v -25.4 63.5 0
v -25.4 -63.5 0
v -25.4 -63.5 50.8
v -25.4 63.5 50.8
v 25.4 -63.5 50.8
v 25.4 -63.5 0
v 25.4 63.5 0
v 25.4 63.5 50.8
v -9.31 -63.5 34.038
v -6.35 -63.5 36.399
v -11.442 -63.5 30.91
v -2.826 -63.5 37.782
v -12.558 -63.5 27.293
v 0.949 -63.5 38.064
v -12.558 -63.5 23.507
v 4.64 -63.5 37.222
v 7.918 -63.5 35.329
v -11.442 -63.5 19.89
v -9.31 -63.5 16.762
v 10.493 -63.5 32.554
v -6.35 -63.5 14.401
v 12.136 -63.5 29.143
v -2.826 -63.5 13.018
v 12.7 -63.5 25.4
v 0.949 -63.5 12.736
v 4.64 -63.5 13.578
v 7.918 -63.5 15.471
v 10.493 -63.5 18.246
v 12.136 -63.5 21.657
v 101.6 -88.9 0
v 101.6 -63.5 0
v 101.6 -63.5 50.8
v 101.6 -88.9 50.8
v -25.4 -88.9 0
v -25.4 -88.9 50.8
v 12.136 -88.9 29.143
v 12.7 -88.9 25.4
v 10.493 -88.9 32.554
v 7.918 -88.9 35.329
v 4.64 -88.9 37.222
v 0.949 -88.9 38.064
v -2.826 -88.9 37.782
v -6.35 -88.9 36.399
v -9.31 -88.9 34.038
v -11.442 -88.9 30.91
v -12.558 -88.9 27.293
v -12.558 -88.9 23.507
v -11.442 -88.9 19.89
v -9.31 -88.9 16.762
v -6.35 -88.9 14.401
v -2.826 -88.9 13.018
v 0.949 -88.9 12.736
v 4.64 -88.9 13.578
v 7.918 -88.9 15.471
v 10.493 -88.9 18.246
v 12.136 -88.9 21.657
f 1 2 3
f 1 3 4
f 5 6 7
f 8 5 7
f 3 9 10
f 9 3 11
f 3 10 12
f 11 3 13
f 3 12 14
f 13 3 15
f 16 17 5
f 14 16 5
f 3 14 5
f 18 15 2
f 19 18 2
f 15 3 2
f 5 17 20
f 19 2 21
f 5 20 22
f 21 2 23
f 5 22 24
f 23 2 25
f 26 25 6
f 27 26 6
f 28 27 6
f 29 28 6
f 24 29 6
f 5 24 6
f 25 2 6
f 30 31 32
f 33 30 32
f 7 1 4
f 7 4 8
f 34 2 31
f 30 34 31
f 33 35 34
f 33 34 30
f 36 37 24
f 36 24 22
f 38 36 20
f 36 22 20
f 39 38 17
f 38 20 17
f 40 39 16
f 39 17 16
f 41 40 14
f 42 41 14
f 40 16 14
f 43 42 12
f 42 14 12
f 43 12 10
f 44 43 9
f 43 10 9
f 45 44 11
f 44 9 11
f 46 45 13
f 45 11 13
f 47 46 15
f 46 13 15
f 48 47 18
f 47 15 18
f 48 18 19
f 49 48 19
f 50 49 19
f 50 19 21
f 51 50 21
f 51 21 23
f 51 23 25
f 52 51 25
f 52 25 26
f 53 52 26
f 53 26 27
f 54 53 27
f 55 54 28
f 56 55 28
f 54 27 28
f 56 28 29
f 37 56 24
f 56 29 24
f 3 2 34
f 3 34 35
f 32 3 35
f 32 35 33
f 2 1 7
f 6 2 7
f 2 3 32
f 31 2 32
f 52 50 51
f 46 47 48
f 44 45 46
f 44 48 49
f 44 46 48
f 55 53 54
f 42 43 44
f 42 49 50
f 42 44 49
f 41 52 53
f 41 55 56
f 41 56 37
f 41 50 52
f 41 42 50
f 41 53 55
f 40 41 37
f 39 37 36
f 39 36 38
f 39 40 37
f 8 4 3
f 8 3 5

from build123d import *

# Parameters (mm, degrees)
F0_W     = 50.8
F0_H     = 127
F1_DEPTH = 50.8
F2_R     = 12.7
F3_DEPTH = 25.4
F4_W     = 127
F4_H     = 50.8
F5_DEPTH = 25.4


with BuildPart() as f1:
    # F0 (on Top) → F1 (new body)
    with BuildSketch(Plane.XY):
        Rectangle(F0_W, F0_H)
    extrude(amount=F1_DEPTH)

    # F2 (on face) → F3 (join)
    with BuildSketch(Plane.XZ.offset(63.5)):
        with Locations((0, 25.4)):
            Circle(F2_R)
    extrude(amount=F3_DEPTH)


with BuildPart() as f5:
    # F4 (on face) → F5 (new body)
    with BuildSketch(Plane.XZ.offset(63.5)):
        with Locations((38.1, 25.4)):
            Rectangle(F4_W, F4_H)
    extrude(amount=F5_DEPTH)


solid = Compound([f1.part, f5.part])
